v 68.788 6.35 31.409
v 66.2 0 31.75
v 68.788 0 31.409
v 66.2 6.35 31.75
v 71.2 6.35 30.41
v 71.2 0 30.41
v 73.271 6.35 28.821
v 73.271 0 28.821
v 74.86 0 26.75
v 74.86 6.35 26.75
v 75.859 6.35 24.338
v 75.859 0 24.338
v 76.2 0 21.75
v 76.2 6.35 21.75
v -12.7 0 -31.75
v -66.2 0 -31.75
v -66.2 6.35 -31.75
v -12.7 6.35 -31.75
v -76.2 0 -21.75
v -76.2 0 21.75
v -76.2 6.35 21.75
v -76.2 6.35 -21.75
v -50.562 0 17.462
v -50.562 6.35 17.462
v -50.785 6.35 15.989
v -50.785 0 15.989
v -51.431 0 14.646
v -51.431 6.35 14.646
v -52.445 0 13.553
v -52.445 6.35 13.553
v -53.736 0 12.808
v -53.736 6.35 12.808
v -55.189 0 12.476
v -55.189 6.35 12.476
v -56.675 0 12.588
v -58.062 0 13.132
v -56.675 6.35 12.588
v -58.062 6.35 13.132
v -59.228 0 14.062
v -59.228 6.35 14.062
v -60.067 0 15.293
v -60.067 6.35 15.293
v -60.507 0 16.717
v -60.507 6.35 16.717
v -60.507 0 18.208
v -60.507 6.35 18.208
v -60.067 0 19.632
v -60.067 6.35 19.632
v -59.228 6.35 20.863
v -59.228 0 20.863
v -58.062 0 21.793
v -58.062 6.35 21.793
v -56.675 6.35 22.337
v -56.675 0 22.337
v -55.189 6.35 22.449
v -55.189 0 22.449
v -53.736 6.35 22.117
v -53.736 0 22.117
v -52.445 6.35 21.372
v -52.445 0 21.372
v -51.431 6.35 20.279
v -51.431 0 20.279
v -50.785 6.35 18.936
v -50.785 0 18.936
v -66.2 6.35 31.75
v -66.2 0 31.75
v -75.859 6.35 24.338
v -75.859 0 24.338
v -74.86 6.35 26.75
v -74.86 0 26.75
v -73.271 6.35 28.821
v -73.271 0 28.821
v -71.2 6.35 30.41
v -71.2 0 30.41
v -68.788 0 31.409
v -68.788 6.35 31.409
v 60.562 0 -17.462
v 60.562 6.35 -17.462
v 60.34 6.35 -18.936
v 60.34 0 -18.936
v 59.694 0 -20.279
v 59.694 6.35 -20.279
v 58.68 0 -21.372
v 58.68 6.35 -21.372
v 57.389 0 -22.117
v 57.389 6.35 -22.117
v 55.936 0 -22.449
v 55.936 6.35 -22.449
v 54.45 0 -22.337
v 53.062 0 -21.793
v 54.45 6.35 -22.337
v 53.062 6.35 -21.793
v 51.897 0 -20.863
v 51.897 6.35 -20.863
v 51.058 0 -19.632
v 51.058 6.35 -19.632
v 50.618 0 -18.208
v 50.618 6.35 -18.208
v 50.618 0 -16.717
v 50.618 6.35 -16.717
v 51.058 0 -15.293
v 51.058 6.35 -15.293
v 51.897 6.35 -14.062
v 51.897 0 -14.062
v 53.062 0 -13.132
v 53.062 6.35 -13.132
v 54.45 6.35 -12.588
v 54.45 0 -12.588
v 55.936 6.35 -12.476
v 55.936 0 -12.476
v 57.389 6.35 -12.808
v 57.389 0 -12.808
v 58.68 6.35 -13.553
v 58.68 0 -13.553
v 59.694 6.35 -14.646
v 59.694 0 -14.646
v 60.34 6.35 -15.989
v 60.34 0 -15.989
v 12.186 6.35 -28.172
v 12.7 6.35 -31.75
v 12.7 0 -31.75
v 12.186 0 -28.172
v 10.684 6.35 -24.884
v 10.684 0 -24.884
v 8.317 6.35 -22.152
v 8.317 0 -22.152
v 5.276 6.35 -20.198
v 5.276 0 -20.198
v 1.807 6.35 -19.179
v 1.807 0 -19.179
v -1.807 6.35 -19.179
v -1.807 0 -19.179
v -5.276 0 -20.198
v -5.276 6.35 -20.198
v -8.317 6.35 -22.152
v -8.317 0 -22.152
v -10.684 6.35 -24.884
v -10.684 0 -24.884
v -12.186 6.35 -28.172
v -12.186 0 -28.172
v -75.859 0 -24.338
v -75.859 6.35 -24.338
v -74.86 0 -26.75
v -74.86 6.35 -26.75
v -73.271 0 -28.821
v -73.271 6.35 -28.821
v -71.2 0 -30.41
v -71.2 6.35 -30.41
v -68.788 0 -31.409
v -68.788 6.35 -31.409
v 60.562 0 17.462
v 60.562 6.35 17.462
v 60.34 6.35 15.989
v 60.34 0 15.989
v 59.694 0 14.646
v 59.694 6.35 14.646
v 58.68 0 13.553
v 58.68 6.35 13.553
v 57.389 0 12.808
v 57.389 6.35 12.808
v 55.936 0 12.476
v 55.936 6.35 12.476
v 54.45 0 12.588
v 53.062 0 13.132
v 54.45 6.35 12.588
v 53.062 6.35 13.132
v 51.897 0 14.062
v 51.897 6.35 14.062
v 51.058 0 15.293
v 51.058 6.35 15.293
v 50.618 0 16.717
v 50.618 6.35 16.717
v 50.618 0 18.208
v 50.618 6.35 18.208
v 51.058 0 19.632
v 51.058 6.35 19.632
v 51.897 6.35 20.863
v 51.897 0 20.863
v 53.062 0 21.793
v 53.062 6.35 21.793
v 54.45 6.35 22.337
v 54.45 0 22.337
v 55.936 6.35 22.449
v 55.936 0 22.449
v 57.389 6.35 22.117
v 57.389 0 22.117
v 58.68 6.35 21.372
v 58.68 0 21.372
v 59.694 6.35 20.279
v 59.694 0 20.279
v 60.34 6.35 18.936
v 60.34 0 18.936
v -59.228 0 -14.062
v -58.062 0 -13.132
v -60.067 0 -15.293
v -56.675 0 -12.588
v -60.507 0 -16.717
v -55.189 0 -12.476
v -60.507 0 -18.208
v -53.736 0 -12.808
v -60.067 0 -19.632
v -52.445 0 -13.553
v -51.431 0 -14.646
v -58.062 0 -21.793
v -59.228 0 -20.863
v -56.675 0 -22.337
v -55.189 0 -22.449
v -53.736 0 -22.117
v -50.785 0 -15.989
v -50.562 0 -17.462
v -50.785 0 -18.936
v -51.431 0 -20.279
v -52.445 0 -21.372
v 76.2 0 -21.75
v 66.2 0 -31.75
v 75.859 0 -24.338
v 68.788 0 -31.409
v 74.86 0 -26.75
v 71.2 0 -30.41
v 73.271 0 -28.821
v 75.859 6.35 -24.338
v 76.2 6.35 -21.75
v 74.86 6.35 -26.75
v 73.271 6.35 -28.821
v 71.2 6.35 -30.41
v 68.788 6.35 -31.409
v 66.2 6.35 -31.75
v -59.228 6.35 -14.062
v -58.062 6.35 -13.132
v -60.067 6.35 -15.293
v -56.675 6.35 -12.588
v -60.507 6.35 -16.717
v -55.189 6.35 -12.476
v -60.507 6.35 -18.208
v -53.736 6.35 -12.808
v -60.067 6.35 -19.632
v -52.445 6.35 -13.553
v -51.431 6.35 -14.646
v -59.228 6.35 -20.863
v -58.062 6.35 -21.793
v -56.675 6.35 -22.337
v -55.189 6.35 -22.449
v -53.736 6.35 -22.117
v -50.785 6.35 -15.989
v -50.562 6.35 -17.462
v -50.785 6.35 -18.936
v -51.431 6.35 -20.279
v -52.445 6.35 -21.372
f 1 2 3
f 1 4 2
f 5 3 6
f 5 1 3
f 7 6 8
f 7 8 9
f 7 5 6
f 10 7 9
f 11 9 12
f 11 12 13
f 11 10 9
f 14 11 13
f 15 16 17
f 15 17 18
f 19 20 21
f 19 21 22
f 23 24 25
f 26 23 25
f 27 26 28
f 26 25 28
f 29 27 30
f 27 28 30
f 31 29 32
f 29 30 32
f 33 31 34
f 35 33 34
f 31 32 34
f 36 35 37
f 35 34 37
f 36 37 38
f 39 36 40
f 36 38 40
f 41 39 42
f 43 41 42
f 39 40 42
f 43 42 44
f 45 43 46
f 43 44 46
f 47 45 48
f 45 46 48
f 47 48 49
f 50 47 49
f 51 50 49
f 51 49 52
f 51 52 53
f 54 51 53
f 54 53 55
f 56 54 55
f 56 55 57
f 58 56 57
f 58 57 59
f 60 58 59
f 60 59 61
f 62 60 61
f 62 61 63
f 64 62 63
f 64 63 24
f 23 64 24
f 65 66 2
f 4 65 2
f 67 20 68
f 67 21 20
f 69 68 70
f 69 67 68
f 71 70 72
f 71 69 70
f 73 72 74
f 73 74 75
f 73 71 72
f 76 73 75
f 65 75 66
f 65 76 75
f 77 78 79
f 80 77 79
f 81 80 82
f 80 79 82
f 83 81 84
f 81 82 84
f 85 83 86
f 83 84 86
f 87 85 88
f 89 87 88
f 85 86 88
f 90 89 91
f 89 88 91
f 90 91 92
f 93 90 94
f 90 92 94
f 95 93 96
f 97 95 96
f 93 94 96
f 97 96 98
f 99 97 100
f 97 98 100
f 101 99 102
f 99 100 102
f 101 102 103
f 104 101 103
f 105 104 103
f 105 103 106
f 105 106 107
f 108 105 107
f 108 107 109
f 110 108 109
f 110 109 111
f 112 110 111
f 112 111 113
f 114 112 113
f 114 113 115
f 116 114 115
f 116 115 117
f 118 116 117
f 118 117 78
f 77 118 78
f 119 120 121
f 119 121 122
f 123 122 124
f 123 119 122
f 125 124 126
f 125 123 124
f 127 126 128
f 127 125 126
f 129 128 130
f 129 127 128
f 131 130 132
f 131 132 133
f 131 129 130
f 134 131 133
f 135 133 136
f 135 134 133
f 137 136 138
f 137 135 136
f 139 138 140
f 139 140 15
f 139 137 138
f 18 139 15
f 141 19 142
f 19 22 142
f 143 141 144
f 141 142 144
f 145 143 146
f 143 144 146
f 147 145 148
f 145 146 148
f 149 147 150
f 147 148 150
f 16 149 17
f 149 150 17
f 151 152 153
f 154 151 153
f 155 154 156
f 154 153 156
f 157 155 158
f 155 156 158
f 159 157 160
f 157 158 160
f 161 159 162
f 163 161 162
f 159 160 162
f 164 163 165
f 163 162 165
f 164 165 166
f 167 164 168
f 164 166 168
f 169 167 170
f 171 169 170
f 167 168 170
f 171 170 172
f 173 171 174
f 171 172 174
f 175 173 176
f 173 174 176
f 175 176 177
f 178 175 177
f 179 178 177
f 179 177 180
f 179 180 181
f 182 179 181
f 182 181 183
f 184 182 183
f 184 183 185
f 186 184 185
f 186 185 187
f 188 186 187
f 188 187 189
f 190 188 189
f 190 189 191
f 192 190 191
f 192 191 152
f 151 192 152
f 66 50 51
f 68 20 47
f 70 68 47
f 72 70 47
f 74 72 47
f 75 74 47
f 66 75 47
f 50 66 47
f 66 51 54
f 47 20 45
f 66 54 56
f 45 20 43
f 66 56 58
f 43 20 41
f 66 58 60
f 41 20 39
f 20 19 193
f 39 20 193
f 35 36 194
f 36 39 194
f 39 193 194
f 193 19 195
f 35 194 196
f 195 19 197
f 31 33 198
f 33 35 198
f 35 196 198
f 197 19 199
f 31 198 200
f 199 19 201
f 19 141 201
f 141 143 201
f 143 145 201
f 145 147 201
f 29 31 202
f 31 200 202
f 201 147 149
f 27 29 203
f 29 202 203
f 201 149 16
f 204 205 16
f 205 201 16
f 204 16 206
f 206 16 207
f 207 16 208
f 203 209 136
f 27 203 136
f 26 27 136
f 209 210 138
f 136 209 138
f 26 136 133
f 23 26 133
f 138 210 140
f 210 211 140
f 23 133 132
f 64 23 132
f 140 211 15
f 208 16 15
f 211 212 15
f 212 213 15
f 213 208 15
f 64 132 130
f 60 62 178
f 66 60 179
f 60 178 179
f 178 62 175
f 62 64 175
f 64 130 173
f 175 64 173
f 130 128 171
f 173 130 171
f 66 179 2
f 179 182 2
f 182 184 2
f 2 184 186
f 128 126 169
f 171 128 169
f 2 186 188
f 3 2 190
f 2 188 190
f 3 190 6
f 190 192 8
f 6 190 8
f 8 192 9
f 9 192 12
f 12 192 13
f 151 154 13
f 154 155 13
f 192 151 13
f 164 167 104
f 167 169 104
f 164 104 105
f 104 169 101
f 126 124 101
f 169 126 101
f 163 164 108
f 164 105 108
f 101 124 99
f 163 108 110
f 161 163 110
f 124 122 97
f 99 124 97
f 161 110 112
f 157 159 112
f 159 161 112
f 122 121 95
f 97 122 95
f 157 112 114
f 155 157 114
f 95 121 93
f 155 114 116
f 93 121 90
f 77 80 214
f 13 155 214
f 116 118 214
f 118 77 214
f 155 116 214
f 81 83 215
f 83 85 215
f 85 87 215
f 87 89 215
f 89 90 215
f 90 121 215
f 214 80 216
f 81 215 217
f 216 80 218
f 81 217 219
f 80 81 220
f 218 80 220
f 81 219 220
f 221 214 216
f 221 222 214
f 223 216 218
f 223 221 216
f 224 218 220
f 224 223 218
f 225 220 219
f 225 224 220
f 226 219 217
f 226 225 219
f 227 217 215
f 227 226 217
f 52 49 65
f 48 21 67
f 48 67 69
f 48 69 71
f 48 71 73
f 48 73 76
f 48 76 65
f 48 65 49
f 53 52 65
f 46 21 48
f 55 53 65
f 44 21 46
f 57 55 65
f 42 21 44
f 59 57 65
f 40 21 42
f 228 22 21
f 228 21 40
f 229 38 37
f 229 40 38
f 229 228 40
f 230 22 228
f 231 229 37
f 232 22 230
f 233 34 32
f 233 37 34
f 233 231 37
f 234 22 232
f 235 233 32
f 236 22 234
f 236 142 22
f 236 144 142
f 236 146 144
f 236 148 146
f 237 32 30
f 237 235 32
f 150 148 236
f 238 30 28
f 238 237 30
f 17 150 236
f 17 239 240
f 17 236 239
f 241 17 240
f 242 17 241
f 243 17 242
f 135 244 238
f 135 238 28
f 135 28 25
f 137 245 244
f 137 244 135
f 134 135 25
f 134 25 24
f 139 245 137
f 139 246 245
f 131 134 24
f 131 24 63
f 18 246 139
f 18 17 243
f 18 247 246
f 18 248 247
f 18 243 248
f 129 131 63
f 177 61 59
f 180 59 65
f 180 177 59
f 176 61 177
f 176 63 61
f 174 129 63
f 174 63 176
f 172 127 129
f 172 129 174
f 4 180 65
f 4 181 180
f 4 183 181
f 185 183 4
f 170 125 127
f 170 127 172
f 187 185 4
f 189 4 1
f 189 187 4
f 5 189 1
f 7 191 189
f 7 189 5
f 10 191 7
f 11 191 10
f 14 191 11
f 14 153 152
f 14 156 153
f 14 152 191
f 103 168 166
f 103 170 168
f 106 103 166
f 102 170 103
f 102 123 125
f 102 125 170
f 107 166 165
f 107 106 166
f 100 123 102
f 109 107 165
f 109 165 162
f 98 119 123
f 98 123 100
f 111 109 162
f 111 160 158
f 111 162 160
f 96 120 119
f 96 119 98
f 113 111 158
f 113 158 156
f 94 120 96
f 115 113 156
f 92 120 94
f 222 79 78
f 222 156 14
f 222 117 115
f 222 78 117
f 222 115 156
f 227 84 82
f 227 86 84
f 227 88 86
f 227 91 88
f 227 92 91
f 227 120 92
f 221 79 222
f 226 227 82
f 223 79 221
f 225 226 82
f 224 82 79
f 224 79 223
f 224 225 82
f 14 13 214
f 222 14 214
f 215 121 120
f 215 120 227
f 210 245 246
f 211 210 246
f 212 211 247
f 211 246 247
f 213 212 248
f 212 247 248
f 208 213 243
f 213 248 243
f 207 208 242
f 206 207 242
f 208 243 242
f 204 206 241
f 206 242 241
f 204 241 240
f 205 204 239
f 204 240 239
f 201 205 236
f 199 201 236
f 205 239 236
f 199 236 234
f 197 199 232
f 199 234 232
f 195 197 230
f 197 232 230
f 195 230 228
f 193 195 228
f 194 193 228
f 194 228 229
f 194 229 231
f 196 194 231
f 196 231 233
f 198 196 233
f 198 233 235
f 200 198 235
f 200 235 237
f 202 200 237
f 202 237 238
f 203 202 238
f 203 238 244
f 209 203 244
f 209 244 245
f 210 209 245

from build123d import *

# Parameters (mm, degrees)
SKETCH1_W           = 152.4
SKETCH1_H           = 63.5
BOSS_EXTRUDE1_DEPTH = 6.35
FILLET1_R           = 10
CUT_EXTRUDE4_DEPTH  = 6.35
SKETCH2_R           = 5
CUT_EXTRUDE5_DEPTH  = 10


with BuildPart() as part:
    # Sketch1 → Boss-Extrude1 (new body)
    with BuildSketch(Plane(origin=(0, 0, 0), x_dir=(1, 0, 0), z_dir=(0, 1, 0))):
        Rectangle(SKETCH1_W, SKETCH1_H)
    extrude(amount=BOSS_EXTRUDE1_DEPTH)

    # Fillet1
    fillet1_edges = [part.edges().sort_by_distance(p)[0] for p in [
        (76.2, 3.175, 31.75),
        (-76.2, 3.175, 31.75),
        (-76.2, 3.175, -31.75),
        (76.2, 3.175, -31.75),
    ]]
    fillet(fillet1_edges, radius=FILLET1_R)

    # Sketch3 → Cut-Extrude4 (cut)
    with BuildSketch(Plane(origin=(0, 6.35, 0), x_dir=(1, 0, 0), z_dir=(0, 1, 0))):
        with BuildLine():
            Line((-12.7, 31.75), (12.7, 31.75))
            ThreePointArc((12.7, 31.75), (0, 19.05), (-12.7, 31.75))
        make_face()
    extrude(amount=-CUT_EXTRUDE4_DEPTH, mode=Mode.SUBTRACT)

    # Sketch2 → Cut-Extrude5 (cut)
    with BuildSketch(Plane(origin=(0, 6.35, 0), x_dir=(1, 0, 0), z_dir=(0, 1, 0))):
        with Locations((-55.5625, 17.4625)):
            Circle(SKETCH2_R)
        with Locations((55.5625, 17.4625)):
            Circle(SKETCH2_R)
        with Locations((55.5625, -17.4625)):
            Circle(SKETCH2_R)
        with Locations((-55.5625, -17.4625)):
            Circle(SKETCH2_R)
    extrude(amount=-CUT_EXTRUDE5_DEPTH, mode=Mode.SUBTRACT)


solid = part.part
